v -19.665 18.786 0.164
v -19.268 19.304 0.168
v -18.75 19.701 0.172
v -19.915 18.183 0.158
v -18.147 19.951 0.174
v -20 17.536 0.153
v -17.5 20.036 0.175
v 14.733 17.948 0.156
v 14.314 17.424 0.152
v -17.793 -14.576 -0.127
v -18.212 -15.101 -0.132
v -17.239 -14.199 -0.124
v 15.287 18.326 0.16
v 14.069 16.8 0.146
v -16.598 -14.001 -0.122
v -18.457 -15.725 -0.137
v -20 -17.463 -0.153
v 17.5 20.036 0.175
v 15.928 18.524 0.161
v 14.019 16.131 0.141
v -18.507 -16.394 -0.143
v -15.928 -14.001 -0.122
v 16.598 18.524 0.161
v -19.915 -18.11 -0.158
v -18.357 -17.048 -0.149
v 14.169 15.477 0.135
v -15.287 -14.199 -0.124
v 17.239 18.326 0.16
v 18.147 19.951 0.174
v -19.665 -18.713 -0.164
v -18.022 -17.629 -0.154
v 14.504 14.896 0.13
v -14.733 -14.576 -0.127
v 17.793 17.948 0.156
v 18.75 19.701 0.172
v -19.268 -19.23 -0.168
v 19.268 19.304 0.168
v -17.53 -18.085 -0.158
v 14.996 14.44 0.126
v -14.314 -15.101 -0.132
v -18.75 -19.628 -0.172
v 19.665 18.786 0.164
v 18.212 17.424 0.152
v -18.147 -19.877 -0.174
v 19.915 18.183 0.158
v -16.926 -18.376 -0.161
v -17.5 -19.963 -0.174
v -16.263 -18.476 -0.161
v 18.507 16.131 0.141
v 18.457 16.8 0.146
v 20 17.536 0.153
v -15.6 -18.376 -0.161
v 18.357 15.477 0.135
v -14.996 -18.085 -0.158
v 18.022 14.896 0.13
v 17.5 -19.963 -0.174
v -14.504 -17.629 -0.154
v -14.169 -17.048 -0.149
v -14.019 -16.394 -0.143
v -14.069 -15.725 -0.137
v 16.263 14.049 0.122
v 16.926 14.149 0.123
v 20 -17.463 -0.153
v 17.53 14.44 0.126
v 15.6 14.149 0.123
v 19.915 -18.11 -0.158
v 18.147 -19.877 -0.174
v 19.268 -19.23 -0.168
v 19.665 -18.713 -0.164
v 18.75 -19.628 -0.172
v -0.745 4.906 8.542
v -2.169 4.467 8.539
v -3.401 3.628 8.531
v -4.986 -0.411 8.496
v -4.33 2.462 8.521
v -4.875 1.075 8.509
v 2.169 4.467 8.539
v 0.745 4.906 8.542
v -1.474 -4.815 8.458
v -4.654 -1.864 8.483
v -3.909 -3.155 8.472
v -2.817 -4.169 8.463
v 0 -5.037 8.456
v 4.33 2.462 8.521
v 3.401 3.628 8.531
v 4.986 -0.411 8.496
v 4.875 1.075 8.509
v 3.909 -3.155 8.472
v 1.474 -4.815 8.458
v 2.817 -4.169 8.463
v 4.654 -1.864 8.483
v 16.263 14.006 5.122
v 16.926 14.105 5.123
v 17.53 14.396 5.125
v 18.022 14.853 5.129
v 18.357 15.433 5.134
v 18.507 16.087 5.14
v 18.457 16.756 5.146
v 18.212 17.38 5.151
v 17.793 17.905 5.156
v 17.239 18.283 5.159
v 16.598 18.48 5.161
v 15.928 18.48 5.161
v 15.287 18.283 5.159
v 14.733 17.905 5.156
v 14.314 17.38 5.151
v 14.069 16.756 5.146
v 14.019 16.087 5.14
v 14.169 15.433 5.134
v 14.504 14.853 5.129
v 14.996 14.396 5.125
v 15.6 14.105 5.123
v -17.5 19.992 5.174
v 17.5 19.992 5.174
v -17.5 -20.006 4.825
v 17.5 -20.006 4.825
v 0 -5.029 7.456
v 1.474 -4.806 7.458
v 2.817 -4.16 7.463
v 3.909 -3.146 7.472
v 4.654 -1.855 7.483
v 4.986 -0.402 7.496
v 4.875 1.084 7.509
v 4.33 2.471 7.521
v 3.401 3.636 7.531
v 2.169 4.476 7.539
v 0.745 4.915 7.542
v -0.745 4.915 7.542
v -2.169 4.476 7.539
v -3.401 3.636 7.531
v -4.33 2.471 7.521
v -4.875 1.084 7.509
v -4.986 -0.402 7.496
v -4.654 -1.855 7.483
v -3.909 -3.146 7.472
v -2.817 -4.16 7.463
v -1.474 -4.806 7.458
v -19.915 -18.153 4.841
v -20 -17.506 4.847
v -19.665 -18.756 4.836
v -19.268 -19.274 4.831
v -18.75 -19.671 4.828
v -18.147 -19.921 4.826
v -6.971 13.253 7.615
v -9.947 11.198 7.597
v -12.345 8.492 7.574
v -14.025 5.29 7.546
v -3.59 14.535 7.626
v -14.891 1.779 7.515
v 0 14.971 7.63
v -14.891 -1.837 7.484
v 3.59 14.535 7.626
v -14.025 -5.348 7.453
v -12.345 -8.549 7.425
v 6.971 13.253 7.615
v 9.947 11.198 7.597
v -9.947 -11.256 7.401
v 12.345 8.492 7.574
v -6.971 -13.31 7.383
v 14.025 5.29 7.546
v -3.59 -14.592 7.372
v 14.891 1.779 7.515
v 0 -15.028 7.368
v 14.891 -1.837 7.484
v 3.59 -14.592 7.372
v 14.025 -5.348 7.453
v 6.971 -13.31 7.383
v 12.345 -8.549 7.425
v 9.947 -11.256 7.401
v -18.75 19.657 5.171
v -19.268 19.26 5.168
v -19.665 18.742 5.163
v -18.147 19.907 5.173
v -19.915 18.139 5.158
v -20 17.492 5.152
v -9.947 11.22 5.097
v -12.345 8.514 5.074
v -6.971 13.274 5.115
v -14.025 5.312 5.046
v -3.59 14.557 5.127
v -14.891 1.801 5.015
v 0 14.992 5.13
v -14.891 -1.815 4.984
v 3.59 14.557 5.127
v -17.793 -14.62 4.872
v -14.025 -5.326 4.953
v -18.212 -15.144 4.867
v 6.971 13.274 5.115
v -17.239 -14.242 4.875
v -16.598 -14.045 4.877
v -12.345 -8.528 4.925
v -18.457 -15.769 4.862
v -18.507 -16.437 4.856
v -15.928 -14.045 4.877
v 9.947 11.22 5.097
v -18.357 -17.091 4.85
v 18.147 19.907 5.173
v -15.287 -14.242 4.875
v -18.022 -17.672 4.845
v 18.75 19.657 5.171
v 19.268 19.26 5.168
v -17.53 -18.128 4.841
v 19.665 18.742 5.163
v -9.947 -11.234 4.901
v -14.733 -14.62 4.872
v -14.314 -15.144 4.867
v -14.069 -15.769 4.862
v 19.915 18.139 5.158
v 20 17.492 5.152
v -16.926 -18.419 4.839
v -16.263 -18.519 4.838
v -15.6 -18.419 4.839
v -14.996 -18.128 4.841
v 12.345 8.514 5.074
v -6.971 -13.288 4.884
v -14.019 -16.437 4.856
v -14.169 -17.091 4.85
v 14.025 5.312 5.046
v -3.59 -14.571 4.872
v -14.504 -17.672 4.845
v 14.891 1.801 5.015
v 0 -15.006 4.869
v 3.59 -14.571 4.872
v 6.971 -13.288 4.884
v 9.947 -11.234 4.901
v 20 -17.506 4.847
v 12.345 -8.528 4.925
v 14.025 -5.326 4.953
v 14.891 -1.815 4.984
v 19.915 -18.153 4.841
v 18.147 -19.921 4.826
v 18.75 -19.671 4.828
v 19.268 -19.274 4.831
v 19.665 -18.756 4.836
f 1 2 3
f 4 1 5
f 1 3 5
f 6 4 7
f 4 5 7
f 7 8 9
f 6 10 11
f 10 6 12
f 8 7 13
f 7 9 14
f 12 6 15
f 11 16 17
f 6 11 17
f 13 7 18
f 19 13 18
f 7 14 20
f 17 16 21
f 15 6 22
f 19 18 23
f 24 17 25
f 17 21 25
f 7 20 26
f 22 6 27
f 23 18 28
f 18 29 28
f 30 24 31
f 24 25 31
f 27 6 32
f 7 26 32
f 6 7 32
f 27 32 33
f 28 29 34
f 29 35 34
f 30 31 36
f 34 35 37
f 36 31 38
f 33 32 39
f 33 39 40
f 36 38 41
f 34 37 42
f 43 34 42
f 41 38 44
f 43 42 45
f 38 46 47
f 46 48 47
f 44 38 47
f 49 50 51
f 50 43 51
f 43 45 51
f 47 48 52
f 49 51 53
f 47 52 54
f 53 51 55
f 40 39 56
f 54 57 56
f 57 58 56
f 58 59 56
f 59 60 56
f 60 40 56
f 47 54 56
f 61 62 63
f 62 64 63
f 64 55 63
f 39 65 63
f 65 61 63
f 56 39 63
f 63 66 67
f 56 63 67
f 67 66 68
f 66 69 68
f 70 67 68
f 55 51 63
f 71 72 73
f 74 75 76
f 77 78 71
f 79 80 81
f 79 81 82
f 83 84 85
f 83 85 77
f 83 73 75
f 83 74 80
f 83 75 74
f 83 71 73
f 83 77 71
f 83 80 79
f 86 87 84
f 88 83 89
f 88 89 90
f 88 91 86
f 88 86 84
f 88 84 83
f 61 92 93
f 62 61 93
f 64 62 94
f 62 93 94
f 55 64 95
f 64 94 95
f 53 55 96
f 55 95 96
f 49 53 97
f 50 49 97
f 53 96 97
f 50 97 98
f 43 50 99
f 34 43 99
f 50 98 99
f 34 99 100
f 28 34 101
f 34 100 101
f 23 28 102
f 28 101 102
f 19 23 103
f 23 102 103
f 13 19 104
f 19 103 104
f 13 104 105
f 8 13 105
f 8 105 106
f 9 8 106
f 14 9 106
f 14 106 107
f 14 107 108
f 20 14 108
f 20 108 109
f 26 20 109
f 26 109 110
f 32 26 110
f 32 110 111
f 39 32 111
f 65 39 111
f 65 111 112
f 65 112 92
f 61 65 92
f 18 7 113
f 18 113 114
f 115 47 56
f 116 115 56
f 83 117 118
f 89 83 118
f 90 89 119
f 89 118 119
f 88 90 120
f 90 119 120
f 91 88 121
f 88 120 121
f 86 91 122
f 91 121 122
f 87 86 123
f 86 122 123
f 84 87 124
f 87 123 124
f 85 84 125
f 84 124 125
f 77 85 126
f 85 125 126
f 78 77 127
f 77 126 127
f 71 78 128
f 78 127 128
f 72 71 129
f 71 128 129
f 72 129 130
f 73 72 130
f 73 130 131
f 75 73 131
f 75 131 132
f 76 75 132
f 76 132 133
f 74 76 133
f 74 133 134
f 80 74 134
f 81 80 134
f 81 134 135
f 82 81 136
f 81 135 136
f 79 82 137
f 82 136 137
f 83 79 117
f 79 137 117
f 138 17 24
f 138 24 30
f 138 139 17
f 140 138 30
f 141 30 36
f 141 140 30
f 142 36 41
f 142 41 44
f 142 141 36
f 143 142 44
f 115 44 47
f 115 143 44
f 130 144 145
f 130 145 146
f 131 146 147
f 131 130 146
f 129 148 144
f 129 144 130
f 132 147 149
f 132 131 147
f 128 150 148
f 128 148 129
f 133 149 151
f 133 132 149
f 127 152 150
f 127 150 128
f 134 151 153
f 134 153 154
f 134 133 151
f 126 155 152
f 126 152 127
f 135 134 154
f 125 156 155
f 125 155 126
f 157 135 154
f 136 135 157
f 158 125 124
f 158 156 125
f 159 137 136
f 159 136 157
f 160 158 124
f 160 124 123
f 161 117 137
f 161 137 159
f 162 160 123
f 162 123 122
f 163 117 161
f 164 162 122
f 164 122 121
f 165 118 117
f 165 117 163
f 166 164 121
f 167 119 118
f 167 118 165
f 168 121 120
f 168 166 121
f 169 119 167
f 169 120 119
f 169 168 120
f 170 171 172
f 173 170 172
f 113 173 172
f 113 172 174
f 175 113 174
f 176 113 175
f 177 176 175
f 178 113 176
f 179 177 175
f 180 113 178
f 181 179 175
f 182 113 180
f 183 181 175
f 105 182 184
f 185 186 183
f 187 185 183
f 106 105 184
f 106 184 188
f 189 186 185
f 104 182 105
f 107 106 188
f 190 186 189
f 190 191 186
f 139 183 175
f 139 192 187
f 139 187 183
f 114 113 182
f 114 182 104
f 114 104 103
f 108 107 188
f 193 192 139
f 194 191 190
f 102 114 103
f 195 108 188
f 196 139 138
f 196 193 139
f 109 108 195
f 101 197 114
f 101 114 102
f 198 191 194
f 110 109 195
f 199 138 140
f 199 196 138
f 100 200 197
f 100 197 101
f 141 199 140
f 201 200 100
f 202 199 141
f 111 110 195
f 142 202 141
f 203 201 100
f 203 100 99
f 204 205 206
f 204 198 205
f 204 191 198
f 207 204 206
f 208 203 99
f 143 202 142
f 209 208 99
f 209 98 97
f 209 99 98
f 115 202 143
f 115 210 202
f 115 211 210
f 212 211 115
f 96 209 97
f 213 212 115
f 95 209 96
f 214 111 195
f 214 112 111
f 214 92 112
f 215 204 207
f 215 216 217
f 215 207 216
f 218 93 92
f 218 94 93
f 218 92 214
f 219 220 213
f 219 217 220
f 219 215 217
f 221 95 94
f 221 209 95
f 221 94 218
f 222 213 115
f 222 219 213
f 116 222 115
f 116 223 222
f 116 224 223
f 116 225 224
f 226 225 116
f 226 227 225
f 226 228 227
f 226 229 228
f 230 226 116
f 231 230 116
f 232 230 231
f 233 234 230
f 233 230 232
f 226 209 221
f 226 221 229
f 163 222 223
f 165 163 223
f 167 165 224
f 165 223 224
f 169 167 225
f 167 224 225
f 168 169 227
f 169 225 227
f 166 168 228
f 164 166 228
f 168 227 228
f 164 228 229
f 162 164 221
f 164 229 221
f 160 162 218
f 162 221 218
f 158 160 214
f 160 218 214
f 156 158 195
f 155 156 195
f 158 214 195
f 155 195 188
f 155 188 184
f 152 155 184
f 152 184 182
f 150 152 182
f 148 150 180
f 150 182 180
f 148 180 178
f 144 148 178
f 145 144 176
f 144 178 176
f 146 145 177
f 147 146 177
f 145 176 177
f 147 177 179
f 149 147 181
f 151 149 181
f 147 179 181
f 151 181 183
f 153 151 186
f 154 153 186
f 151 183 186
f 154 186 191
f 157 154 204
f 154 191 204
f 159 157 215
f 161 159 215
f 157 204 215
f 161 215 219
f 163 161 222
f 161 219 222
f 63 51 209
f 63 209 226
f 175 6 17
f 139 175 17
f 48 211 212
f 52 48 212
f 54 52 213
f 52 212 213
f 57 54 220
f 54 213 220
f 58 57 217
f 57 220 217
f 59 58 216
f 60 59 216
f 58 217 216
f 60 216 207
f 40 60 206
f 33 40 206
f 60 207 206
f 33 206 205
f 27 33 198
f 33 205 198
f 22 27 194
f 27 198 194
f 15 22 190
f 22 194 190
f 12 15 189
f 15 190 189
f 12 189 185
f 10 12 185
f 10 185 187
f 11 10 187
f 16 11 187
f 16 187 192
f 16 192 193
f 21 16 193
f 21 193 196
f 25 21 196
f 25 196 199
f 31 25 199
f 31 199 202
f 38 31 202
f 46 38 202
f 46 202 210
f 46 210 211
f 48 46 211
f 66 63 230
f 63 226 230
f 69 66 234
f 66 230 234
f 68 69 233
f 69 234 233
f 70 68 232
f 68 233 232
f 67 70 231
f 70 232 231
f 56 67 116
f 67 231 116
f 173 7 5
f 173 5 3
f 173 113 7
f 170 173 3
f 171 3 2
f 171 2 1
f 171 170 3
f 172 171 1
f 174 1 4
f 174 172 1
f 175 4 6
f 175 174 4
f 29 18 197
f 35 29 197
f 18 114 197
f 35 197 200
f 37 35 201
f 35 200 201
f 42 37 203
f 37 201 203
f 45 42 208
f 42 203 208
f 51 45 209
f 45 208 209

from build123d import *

# Parameters (mm, degrees)
BOSS_EXTRUDE2_DEPTH      = 4.999462447
BOSS_EXTRUDE2_DEPTH_BACK = 0.0001
SKETCH4_W                = 40
SKETCH4_H                = 40
SKETCH6_R                = 15
BOSS_EXTRUDE3_DEPTH      = 2.5
SKETCH7_R                = 5
BOSS_EXTRUDE4_DEPTH      = 1
SKETCH9_R                = 2.25
CUT_EXTRUDE1_DEPTH       = 5
SKETCH10_R               = 2.25
CUT_EXTRUDE2_DEPTH       = 5
FILLET2_R                = 2.5
BODY_MOVE_COPY2_ANGLE    = 90.001090824


with BuildPart() as part:
    # Sketch4 → Boss-Extrude2 (new, two sides: drawn at the far end of the back side and taken through both)
    with BuildSketch(Plane.XY.offset(-BOSS_EXTRUDE2_DEPTH_BACK)):
        Rectangle(SKETCH4_W, SKETCH4_H)
    extrude(amount=BOSS_EXTRUDE2_DEPTH + BOSS_EXTRUDE2_DEPTH_BACK)

    # Sketch6 → Boss-Extrude3 (add)
    with BuildSketch(Plane.XY.offset(4.999462447)):
        Circle(SKETCH6_R)
    extrude(amount=BOSS_EXTRUDE3_DEPTH)

    # Sketch7 → Boss-Extrude4 (add)
    with BuildSketch(Plane.XY.offset(7.499462447)):
        Circle(SKETCH7_R)
    extrude(amount=BOSS_EXTRUDE4_DEPTH)

    # Sketch9 → Cut-Extrude1 (cut)
    with BuildSketch(Plane.XY.offset(4.999462447)):
        with Locations((-16.263, 16.263)):
            Circle(SKETCH9_R)
    extrude(amount=-CUT_EXTRUDE1_DEPTH, mode=Mode.SUBTRACT)

    # Sketch10 → Cut-Extrude2 (cut)
    with BuildSketch(Plane.XY.offset(4.999462447)):
        with Locations((16.263, -16.263)):
            Circle(SKETCH10_R)
    extrude(amount=-CUT_EXTRUDE2_DEPTH, mode=Mode.SUBTRACT)

    # Fillet2
    fillet2_edges = [part.edges().sort_by_distance(p)[0] for p in [
        (20, -20, 2.499681224),
        (-20, -20, 2.499681224),
        (-20, 20, 2.499681224),
        (20, 20, 2.499681224),
    ]]
    fillet(fillet2_edges, radius=FILLET2_R)


with BuildPart() as part_1:
    # Body-Move/Copy2: moved
    add(part.part.moved(Location((0, 0, 0))).rotate(Axis((0.018337793, 0.018337793, 0.000160028), (0.004363267749989983, 0.004363267749984885, -0.9999809617133137)), BODY_MOVE_COPY2_ANGLE))


solid = part_1.part
